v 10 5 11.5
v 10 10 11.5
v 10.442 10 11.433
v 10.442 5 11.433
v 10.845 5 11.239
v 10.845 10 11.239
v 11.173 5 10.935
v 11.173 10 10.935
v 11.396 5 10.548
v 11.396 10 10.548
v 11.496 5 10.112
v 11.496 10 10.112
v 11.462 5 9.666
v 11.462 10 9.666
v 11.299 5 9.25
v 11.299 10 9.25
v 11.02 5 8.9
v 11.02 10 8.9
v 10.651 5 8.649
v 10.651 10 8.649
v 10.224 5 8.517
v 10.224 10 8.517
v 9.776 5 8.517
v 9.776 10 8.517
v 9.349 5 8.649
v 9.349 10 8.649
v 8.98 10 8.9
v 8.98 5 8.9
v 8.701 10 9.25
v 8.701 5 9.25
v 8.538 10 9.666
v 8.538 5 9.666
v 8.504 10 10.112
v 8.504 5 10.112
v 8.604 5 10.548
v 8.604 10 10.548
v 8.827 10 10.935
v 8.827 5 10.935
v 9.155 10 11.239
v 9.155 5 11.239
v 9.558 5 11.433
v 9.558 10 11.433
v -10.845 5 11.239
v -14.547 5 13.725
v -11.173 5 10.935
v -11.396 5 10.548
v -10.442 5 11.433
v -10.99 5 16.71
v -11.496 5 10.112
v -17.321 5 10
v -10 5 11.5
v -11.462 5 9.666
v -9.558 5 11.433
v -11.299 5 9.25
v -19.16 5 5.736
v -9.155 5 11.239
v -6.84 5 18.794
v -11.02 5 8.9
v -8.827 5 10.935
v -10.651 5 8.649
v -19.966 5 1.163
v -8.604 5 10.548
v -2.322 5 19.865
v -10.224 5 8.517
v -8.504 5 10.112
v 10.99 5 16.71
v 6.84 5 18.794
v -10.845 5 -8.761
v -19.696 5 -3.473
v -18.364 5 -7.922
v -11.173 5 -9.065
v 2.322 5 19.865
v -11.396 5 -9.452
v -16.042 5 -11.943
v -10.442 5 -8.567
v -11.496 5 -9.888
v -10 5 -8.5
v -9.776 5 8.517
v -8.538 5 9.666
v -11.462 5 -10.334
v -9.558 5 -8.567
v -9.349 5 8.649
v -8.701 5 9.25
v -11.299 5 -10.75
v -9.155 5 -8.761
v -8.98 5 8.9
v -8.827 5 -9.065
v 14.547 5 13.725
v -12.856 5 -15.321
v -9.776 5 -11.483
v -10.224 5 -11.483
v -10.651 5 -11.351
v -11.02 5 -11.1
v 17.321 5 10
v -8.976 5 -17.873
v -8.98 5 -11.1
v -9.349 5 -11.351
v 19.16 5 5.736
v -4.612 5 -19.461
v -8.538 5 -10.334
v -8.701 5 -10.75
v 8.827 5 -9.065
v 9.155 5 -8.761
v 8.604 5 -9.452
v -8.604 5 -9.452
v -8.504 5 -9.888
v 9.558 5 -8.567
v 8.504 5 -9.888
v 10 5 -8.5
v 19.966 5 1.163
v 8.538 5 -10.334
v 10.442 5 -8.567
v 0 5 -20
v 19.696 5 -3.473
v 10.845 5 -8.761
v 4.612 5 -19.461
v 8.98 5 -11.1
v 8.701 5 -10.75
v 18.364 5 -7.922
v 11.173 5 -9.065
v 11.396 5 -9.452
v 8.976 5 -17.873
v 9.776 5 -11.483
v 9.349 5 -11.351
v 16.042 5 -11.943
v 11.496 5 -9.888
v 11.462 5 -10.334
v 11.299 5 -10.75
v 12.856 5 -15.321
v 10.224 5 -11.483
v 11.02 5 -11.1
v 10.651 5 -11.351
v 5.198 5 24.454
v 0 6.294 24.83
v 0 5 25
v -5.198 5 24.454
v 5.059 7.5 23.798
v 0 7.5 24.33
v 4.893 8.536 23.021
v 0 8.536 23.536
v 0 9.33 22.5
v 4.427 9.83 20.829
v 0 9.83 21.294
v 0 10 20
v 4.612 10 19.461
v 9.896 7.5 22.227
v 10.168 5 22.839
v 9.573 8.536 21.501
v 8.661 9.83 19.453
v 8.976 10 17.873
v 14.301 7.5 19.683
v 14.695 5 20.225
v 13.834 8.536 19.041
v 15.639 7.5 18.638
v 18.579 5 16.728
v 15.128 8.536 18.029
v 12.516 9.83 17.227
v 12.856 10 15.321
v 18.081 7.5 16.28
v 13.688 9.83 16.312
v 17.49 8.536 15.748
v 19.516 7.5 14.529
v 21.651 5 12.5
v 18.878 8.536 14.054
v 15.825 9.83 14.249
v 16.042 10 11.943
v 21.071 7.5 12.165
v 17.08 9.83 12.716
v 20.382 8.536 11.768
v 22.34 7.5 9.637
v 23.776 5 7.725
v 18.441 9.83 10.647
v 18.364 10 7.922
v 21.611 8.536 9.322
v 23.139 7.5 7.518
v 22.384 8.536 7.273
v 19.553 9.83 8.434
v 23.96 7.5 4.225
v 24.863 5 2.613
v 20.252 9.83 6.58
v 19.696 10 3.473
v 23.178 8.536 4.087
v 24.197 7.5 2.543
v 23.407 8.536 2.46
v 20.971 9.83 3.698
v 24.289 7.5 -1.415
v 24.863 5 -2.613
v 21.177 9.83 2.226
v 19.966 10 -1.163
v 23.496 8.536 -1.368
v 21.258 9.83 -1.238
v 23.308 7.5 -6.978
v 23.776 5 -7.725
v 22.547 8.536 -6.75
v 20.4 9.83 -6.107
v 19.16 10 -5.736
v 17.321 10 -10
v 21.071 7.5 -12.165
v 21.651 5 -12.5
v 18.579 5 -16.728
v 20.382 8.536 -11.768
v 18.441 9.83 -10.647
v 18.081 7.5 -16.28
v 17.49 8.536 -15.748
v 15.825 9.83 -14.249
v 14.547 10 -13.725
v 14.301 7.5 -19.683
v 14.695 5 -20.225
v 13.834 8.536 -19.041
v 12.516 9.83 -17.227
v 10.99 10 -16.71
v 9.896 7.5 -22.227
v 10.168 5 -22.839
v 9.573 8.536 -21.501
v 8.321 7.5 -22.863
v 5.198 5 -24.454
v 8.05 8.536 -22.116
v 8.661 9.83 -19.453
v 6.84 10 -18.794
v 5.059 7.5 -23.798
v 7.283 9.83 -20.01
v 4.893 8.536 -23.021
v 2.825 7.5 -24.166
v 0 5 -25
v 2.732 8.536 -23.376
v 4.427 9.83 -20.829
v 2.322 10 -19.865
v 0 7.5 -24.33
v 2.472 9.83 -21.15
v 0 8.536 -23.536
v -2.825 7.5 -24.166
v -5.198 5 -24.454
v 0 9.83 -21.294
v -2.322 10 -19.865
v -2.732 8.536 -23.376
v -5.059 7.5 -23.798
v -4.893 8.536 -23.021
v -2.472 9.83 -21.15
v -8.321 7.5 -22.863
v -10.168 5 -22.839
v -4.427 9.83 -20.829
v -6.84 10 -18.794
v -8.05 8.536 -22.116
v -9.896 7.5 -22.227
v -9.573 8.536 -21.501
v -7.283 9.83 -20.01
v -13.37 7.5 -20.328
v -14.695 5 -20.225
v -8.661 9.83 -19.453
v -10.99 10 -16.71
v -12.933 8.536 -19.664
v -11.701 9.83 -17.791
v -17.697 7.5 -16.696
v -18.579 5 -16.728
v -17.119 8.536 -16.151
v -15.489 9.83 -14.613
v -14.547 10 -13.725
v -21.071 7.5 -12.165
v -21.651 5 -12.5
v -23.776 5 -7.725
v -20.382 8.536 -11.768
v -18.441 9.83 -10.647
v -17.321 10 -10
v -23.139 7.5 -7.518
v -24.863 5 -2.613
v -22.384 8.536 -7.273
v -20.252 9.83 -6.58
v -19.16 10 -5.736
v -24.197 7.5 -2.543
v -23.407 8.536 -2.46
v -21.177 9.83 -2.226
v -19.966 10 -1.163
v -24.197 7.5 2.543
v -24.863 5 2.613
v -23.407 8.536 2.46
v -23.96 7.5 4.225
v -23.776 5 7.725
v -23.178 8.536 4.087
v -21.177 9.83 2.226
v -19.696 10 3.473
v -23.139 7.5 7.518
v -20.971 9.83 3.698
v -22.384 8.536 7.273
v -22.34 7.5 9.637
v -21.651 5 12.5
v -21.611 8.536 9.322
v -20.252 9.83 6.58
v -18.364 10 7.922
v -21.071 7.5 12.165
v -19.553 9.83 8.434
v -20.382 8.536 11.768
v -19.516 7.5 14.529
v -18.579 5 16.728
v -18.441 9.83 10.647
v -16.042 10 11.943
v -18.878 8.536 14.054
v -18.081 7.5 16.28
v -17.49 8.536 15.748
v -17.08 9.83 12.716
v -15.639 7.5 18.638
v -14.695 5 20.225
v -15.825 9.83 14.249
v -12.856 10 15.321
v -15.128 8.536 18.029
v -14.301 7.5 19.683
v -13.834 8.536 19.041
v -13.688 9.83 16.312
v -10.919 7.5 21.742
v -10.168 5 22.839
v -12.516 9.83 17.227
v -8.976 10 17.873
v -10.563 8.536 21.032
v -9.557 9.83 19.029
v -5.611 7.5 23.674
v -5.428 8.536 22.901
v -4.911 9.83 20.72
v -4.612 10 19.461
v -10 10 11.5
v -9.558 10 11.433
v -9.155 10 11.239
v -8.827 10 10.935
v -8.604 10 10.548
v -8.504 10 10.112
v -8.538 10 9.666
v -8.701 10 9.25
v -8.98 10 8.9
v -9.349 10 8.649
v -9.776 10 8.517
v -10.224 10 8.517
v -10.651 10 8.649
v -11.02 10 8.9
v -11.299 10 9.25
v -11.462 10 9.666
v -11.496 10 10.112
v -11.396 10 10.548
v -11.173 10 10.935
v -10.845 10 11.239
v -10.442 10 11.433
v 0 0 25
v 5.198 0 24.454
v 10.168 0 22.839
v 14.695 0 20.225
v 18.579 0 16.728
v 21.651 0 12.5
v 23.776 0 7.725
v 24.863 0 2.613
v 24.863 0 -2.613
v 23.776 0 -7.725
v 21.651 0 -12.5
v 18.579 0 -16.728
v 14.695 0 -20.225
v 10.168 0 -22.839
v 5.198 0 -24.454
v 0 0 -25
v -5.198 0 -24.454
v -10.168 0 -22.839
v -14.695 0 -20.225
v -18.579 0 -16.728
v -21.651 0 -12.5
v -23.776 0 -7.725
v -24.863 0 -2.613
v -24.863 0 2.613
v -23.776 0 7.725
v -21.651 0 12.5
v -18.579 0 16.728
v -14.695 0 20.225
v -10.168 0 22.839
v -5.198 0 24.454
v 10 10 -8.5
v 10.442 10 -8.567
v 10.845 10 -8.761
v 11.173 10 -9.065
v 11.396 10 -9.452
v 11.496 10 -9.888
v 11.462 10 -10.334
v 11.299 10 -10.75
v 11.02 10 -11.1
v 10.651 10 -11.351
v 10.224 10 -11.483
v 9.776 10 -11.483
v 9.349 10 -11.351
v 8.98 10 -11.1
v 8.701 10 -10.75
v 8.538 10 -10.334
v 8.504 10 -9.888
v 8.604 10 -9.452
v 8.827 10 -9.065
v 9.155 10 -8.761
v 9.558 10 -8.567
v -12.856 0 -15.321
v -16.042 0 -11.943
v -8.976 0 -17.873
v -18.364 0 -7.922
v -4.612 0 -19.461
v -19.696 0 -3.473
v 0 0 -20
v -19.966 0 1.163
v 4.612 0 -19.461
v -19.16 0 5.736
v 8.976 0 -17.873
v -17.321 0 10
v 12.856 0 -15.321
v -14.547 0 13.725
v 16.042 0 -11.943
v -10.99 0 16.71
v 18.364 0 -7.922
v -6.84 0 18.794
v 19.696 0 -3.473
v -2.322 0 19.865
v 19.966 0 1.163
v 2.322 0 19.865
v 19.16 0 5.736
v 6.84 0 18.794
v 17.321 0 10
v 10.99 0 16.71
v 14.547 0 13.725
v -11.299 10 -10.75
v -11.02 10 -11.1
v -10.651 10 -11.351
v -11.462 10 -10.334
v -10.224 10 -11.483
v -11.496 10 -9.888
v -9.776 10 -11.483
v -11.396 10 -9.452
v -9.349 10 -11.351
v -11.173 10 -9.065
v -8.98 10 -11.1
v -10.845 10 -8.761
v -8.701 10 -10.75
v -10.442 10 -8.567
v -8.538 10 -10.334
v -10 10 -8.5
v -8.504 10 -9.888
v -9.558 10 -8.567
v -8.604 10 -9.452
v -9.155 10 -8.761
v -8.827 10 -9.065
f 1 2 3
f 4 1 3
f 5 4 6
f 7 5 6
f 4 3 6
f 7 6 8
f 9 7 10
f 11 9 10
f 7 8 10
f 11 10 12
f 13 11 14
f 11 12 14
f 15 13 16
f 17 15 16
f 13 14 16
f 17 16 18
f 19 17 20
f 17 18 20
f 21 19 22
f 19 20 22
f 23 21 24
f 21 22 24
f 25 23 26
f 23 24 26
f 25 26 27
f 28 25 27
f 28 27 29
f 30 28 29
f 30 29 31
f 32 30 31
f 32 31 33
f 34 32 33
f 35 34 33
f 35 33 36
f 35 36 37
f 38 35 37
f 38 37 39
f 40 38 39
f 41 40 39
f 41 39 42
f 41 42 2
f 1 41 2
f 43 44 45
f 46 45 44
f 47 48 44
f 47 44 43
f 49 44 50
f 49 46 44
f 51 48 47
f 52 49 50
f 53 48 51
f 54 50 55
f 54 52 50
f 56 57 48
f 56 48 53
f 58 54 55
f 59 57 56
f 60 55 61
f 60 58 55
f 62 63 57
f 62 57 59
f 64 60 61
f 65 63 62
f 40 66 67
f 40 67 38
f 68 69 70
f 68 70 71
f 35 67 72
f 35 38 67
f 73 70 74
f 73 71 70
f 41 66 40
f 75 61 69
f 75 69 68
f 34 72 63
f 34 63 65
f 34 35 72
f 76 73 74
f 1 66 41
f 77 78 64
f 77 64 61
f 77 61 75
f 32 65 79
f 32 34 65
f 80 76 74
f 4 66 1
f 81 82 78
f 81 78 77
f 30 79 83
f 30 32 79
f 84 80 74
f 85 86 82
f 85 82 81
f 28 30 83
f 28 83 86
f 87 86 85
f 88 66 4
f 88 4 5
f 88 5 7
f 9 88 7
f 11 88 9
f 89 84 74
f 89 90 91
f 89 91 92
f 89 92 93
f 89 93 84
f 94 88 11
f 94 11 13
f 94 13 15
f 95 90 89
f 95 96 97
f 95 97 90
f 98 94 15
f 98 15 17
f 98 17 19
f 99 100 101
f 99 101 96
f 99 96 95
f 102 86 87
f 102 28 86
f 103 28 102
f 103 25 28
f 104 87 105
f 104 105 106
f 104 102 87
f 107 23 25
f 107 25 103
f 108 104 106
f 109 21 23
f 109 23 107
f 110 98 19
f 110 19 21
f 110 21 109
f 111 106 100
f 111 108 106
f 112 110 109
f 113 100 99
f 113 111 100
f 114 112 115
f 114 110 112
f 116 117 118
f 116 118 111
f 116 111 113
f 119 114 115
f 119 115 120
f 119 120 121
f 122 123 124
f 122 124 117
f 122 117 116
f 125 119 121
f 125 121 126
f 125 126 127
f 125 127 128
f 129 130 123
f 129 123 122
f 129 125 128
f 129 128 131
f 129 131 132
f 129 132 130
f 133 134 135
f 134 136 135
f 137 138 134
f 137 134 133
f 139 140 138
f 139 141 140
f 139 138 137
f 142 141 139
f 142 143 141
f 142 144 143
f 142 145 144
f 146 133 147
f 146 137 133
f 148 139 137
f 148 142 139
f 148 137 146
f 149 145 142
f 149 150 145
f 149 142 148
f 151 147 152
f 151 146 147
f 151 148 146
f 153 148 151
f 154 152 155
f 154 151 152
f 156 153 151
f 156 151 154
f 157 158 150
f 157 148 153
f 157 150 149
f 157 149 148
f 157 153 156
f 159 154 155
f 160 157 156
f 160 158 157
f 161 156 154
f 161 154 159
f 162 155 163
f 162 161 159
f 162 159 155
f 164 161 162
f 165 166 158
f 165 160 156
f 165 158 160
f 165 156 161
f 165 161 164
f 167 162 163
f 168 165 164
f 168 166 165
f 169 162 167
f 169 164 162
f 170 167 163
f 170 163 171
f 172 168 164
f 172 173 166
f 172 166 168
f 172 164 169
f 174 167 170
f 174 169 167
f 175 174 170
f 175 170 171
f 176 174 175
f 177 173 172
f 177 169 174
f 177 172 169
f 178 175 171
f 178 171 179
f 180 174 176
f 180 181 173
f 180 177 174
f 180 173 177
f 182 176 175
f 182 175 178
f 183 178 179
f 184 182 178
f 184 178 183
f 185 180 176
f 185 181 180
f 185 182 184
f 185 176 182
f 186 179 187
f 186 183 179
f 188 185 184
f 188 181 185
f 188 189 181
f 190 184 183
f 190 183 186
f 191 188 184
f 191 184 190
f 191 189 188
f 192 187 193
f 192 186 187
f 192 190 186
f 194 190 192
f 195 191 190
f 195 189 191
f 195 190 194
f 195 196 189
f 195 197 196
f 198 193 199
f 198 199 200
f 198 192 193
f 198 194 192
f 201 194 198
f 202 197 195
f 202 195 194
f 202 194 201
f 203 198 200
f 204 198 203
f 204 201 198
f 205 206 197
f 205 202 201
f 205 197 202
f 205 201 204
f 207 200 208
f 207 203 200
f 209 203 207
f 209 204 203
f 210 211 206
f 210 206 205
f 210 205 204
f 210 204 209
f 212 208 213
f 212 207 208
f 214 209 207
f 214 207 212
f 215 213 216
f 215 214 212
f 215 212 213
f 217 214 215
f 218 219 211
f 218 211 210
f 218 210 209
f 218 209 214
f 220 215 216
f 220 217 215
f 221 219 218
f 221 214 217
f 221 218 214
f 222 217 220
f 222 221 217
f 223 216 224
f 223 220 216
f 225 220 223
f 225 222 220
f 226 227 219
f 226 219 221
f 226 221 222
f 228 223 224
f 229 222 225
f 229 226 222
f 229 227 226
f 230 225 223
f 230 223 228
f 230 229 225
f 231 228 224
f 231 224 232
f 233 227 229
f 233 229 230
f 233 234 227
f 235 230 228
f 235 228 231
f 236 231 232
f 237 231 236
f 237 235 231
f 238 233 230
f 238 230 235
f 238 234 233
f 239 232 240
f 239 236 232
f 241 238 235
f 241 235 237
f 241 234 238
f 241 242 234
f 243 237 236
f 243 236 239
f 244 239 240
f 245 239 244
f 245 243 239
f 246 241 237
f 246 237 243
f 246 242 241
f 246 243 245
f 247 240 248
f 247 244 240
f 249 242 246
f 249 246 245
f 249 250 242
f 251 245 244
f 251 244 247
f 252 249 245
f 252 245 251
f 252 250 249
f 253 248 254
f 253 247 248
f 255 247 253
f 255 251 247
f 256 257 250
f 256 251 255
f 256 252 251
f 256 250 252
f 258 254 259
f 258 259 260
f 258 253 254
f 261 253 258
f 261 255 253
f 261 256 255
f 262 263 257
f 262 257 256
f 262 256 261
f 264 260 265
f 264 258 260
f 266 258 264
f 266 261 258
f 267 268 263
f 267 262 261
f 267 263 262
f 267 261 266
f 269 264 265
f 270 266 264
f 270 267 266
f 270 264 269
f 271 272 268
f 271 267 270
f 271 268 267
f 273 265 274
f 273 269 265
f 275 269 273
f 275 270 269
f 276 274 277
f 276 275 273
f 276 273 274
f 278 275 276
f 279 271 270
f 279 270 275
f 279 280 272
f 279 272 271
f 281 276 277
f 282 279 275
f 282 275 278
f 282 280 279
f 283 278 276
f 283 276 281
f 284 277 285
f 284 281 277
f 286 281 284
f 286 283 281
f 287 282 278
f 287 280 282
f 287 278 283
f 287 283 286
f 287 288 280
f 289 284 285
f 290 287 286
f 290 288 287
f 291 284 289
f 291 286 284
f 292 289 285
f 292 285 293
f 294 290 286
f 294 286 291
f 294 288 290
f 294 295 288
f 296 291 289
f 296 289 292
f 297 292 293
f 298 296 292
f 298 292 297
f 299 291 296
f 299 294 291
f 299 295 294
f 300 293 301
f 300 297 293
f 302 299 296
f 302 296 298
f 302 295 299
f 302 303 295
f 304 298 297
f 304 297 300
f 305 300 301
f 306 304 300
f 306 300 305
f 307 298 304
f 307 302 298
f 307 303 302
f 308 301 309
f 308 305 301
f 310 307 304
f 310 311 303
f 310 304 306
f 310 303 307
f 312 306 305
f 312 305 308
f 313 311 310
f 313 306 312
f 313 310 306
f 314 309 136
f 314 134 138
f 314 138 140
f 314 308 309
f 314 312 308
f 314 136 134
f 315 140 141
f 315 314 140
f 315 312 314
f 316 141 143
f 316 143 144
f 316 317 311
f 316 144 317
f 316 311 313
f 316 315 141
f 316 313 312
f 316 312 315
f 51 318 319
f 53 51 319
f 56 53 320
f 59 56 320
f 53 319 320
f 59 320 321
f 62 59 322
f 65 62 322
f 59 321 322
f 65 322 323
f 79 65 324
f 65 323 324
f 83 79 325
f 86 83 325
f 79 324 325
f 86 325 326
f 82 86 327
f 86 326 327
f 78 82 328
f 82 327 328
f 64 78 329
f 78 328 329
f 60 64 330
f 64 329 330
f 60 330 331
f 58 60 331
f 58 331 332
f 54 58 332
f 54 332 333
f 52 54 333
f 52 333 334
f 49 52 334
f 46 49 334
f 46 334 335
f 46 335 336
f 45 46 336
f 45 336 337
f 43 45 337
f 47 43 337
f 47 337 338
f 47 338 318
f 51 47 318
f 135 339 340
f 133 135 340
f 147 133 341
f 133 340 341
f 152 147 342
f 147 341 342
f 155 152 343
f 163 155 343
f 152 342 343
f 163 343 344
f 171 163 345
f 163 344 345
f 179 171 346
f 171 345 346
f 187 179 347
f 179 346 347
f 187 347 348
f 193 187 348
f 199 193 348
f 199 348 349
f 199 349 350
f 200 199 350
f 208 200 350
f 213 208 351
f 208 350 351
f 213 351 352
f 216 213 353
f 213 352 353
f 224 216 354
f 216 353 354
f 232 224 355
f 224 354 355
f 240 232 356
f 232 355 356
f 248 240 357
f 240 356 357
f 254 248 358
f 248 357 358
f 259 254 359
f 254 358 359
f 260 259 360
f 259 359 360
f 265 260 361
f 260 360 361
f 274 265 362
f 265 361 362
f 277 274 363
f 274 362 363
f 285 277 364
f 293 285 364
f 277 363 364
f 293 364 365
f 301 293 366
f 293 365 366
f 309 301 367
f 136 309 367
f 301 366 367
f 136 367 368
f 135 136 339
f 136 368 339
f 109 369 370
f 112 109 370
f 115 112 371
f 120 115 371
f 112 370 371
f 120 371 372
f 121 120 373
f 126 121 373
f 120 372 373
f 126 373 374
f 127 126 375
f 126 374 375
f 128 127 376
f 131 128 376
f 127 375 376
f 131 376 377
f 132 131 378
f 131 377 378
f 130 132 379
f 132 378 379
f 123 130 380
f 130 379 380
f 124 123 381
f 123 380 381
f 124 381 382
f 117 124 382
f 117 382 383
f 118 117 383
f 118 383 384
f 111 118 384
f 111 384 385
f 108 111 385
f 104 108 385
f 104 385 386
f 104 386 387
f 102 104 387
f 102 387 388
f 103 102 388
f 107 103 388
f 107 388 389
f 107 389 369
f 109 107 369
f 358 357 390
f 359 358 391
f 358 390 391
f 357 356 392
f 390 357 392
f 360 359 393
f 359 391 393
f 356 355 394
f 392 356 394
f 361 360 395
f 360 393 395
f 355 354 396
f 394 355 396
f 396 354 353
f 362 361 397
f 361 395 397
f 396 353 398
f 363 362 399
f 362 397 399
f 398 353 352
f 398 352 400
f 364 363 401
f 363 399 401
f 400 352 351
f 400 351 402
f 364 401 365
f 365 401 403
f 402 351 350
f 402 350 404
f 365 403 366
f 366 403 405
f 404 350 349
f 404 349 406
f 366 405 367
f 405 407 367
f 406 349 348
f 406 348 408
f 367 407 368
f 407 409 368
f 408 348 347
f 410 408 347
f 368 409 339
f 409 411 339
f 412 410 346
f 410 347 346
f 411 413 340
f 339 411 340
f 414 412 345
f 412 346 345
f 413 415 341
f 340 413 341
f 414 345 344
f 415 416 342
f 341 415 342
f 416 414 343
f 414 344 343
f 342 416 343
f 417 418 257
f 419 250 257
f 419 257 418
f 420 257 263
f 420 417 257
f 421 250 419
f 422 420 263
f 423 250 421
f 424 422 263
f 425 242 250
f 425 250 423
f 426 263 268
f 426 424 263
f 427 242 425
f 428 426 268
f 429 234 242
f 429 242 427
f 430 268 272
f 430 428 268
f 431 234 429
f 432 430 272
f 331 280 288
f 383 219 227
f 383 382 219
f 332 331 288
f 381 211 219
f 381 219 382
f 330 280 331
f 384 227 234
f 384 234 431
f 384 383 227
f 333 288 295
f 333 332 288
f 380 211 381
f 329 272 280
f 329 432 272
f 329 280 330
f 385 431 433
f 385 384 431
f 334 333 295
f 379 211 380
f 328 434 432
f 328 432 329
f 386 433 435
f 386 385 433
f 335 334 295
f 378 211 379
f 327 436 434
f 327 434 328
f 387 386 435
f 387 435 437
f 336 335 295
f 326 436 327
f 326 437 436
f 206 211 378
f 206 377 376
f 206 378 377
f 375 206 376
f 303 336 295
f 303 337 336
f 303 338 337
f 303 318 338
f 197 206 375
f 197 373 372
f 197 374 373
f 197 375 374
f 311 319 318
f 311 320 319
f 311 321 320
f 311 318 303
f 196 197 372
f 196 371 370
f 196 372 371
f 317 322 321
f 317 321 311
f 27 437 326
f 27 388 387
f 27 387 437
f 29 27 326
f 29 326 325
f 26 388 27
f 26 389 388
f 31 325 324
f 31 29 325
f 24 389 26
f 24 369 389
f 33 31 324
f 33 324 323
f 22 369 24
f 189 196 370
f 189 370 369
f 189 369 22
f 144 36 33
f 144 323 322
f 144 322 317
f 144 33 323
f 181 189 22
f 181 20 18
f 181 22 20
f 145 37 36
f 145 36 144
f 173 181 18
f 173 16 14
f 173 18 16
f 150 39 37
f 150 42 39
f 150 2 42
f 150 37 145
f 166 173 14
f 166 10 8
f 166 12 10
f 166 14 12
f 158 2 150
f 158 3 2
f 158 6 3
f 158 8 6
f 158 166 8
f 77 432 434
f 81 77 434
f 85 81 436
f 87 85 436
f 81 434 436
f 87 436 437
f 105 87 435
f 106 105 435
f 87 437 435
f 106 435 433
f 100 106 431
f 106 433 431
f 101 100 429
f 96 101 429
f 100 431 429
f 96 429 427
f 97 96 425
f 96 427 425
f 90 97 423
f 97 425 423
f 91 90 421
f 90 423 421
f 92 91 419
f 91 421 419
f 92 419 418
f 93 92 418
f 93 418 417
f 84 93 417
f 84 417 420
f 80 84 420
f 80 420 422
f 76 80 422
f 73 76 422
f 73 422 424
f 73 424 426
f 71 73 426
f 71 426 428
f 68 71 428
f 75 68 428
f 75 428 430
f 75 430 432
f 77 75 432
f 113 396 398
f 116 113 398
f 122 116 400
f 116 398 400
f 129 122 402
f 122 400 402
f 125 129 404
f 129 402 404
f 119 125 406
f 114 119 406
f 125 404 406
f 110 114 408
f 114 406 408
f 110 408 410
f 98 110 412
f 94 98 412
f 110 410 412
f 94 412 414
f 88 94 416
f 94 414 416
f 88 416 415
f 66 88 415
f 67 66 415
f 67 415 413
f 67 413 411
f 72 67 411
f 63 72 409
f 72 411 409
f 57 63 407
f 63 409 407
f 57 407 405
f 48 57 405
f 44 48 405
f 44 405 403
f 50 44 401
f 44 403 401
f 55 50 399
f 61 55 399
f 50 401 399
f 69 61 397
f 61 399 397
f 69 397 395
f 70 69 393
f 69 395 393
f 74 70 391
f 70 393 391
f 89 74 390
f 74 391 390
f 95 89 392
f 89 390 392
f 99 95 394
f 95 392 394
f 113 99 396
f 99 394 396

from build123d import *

# Parameters (mm, degrees)
SKETCH1_R           = 25
BOSS_EXTRUDE1_DEPTH = 10
FILLET1_R           = 5
SKETCH2_R           = 1.5
CUT_EXTRUDE1_DEPTH  = 37.74234621
SKETCH3_R           = 20
CUT_EXTRUDE2_DEPTH  = 5


with BuildPart() as part:
    # Sketch1 → Boss-Extrude1 (new body)
    with BuildSketch(Plane(origin=(0, 0, 0), x_dir=(1, 0, 0), z_dir=(0, 1, 0))):
        with Locations(Location((0, 0, 0), (0, 0, 270))):
            Circle(SKETCH1_R)
    extrude(amount=BOSS_EXTRUDE1_DEPTH)

    # Fillet1
    fillet1_edges = [part.edges().sort_by_distance(p)[0] for p in [
        (0, 10, -25),
    ]]
    fillet(fillet1_edges, radius=FILLET1_R)

    # Sketch2 → Cut-Extrude1 (cut, through all)
    with BuildSketch(Plane(origin=(0, 10, 0), x_dir=(1, 0, 0), z_dir=(0, 1, 0))):
        with Locations(Location((-10, 10, 0), (0, 0, 270))):
            Circle(SKETCH2_R)
        with Locations(Location((10, 10, 0), (0, 0, 270))):
            Circle(SKETCH2_R)
        with Locations(Location((-10, -10, 0), (0, 0, 270))):
            Circle(SKETCH2_R)
        with Locations(Location((10, -10, 0), (0, 0, 270))):
            Circle(SKETCH2_R)
    extrude(amount=-CUT_EXTRUDE1_DEPTH, mode=Mode.SUBTRACT)

    # Sketch3 → Cut-Extrude2 (cut)
    with BuildSketch(Plane.XZ):
        with Locations(Location((0, 0, 0), (0, 0, 270))):
            Circle(SKETCH3_R)
    extrude(amount=-CUT_EXTRUDE2_DEPTH, mode=Mode.SUBTRACT)


solid = part.part
